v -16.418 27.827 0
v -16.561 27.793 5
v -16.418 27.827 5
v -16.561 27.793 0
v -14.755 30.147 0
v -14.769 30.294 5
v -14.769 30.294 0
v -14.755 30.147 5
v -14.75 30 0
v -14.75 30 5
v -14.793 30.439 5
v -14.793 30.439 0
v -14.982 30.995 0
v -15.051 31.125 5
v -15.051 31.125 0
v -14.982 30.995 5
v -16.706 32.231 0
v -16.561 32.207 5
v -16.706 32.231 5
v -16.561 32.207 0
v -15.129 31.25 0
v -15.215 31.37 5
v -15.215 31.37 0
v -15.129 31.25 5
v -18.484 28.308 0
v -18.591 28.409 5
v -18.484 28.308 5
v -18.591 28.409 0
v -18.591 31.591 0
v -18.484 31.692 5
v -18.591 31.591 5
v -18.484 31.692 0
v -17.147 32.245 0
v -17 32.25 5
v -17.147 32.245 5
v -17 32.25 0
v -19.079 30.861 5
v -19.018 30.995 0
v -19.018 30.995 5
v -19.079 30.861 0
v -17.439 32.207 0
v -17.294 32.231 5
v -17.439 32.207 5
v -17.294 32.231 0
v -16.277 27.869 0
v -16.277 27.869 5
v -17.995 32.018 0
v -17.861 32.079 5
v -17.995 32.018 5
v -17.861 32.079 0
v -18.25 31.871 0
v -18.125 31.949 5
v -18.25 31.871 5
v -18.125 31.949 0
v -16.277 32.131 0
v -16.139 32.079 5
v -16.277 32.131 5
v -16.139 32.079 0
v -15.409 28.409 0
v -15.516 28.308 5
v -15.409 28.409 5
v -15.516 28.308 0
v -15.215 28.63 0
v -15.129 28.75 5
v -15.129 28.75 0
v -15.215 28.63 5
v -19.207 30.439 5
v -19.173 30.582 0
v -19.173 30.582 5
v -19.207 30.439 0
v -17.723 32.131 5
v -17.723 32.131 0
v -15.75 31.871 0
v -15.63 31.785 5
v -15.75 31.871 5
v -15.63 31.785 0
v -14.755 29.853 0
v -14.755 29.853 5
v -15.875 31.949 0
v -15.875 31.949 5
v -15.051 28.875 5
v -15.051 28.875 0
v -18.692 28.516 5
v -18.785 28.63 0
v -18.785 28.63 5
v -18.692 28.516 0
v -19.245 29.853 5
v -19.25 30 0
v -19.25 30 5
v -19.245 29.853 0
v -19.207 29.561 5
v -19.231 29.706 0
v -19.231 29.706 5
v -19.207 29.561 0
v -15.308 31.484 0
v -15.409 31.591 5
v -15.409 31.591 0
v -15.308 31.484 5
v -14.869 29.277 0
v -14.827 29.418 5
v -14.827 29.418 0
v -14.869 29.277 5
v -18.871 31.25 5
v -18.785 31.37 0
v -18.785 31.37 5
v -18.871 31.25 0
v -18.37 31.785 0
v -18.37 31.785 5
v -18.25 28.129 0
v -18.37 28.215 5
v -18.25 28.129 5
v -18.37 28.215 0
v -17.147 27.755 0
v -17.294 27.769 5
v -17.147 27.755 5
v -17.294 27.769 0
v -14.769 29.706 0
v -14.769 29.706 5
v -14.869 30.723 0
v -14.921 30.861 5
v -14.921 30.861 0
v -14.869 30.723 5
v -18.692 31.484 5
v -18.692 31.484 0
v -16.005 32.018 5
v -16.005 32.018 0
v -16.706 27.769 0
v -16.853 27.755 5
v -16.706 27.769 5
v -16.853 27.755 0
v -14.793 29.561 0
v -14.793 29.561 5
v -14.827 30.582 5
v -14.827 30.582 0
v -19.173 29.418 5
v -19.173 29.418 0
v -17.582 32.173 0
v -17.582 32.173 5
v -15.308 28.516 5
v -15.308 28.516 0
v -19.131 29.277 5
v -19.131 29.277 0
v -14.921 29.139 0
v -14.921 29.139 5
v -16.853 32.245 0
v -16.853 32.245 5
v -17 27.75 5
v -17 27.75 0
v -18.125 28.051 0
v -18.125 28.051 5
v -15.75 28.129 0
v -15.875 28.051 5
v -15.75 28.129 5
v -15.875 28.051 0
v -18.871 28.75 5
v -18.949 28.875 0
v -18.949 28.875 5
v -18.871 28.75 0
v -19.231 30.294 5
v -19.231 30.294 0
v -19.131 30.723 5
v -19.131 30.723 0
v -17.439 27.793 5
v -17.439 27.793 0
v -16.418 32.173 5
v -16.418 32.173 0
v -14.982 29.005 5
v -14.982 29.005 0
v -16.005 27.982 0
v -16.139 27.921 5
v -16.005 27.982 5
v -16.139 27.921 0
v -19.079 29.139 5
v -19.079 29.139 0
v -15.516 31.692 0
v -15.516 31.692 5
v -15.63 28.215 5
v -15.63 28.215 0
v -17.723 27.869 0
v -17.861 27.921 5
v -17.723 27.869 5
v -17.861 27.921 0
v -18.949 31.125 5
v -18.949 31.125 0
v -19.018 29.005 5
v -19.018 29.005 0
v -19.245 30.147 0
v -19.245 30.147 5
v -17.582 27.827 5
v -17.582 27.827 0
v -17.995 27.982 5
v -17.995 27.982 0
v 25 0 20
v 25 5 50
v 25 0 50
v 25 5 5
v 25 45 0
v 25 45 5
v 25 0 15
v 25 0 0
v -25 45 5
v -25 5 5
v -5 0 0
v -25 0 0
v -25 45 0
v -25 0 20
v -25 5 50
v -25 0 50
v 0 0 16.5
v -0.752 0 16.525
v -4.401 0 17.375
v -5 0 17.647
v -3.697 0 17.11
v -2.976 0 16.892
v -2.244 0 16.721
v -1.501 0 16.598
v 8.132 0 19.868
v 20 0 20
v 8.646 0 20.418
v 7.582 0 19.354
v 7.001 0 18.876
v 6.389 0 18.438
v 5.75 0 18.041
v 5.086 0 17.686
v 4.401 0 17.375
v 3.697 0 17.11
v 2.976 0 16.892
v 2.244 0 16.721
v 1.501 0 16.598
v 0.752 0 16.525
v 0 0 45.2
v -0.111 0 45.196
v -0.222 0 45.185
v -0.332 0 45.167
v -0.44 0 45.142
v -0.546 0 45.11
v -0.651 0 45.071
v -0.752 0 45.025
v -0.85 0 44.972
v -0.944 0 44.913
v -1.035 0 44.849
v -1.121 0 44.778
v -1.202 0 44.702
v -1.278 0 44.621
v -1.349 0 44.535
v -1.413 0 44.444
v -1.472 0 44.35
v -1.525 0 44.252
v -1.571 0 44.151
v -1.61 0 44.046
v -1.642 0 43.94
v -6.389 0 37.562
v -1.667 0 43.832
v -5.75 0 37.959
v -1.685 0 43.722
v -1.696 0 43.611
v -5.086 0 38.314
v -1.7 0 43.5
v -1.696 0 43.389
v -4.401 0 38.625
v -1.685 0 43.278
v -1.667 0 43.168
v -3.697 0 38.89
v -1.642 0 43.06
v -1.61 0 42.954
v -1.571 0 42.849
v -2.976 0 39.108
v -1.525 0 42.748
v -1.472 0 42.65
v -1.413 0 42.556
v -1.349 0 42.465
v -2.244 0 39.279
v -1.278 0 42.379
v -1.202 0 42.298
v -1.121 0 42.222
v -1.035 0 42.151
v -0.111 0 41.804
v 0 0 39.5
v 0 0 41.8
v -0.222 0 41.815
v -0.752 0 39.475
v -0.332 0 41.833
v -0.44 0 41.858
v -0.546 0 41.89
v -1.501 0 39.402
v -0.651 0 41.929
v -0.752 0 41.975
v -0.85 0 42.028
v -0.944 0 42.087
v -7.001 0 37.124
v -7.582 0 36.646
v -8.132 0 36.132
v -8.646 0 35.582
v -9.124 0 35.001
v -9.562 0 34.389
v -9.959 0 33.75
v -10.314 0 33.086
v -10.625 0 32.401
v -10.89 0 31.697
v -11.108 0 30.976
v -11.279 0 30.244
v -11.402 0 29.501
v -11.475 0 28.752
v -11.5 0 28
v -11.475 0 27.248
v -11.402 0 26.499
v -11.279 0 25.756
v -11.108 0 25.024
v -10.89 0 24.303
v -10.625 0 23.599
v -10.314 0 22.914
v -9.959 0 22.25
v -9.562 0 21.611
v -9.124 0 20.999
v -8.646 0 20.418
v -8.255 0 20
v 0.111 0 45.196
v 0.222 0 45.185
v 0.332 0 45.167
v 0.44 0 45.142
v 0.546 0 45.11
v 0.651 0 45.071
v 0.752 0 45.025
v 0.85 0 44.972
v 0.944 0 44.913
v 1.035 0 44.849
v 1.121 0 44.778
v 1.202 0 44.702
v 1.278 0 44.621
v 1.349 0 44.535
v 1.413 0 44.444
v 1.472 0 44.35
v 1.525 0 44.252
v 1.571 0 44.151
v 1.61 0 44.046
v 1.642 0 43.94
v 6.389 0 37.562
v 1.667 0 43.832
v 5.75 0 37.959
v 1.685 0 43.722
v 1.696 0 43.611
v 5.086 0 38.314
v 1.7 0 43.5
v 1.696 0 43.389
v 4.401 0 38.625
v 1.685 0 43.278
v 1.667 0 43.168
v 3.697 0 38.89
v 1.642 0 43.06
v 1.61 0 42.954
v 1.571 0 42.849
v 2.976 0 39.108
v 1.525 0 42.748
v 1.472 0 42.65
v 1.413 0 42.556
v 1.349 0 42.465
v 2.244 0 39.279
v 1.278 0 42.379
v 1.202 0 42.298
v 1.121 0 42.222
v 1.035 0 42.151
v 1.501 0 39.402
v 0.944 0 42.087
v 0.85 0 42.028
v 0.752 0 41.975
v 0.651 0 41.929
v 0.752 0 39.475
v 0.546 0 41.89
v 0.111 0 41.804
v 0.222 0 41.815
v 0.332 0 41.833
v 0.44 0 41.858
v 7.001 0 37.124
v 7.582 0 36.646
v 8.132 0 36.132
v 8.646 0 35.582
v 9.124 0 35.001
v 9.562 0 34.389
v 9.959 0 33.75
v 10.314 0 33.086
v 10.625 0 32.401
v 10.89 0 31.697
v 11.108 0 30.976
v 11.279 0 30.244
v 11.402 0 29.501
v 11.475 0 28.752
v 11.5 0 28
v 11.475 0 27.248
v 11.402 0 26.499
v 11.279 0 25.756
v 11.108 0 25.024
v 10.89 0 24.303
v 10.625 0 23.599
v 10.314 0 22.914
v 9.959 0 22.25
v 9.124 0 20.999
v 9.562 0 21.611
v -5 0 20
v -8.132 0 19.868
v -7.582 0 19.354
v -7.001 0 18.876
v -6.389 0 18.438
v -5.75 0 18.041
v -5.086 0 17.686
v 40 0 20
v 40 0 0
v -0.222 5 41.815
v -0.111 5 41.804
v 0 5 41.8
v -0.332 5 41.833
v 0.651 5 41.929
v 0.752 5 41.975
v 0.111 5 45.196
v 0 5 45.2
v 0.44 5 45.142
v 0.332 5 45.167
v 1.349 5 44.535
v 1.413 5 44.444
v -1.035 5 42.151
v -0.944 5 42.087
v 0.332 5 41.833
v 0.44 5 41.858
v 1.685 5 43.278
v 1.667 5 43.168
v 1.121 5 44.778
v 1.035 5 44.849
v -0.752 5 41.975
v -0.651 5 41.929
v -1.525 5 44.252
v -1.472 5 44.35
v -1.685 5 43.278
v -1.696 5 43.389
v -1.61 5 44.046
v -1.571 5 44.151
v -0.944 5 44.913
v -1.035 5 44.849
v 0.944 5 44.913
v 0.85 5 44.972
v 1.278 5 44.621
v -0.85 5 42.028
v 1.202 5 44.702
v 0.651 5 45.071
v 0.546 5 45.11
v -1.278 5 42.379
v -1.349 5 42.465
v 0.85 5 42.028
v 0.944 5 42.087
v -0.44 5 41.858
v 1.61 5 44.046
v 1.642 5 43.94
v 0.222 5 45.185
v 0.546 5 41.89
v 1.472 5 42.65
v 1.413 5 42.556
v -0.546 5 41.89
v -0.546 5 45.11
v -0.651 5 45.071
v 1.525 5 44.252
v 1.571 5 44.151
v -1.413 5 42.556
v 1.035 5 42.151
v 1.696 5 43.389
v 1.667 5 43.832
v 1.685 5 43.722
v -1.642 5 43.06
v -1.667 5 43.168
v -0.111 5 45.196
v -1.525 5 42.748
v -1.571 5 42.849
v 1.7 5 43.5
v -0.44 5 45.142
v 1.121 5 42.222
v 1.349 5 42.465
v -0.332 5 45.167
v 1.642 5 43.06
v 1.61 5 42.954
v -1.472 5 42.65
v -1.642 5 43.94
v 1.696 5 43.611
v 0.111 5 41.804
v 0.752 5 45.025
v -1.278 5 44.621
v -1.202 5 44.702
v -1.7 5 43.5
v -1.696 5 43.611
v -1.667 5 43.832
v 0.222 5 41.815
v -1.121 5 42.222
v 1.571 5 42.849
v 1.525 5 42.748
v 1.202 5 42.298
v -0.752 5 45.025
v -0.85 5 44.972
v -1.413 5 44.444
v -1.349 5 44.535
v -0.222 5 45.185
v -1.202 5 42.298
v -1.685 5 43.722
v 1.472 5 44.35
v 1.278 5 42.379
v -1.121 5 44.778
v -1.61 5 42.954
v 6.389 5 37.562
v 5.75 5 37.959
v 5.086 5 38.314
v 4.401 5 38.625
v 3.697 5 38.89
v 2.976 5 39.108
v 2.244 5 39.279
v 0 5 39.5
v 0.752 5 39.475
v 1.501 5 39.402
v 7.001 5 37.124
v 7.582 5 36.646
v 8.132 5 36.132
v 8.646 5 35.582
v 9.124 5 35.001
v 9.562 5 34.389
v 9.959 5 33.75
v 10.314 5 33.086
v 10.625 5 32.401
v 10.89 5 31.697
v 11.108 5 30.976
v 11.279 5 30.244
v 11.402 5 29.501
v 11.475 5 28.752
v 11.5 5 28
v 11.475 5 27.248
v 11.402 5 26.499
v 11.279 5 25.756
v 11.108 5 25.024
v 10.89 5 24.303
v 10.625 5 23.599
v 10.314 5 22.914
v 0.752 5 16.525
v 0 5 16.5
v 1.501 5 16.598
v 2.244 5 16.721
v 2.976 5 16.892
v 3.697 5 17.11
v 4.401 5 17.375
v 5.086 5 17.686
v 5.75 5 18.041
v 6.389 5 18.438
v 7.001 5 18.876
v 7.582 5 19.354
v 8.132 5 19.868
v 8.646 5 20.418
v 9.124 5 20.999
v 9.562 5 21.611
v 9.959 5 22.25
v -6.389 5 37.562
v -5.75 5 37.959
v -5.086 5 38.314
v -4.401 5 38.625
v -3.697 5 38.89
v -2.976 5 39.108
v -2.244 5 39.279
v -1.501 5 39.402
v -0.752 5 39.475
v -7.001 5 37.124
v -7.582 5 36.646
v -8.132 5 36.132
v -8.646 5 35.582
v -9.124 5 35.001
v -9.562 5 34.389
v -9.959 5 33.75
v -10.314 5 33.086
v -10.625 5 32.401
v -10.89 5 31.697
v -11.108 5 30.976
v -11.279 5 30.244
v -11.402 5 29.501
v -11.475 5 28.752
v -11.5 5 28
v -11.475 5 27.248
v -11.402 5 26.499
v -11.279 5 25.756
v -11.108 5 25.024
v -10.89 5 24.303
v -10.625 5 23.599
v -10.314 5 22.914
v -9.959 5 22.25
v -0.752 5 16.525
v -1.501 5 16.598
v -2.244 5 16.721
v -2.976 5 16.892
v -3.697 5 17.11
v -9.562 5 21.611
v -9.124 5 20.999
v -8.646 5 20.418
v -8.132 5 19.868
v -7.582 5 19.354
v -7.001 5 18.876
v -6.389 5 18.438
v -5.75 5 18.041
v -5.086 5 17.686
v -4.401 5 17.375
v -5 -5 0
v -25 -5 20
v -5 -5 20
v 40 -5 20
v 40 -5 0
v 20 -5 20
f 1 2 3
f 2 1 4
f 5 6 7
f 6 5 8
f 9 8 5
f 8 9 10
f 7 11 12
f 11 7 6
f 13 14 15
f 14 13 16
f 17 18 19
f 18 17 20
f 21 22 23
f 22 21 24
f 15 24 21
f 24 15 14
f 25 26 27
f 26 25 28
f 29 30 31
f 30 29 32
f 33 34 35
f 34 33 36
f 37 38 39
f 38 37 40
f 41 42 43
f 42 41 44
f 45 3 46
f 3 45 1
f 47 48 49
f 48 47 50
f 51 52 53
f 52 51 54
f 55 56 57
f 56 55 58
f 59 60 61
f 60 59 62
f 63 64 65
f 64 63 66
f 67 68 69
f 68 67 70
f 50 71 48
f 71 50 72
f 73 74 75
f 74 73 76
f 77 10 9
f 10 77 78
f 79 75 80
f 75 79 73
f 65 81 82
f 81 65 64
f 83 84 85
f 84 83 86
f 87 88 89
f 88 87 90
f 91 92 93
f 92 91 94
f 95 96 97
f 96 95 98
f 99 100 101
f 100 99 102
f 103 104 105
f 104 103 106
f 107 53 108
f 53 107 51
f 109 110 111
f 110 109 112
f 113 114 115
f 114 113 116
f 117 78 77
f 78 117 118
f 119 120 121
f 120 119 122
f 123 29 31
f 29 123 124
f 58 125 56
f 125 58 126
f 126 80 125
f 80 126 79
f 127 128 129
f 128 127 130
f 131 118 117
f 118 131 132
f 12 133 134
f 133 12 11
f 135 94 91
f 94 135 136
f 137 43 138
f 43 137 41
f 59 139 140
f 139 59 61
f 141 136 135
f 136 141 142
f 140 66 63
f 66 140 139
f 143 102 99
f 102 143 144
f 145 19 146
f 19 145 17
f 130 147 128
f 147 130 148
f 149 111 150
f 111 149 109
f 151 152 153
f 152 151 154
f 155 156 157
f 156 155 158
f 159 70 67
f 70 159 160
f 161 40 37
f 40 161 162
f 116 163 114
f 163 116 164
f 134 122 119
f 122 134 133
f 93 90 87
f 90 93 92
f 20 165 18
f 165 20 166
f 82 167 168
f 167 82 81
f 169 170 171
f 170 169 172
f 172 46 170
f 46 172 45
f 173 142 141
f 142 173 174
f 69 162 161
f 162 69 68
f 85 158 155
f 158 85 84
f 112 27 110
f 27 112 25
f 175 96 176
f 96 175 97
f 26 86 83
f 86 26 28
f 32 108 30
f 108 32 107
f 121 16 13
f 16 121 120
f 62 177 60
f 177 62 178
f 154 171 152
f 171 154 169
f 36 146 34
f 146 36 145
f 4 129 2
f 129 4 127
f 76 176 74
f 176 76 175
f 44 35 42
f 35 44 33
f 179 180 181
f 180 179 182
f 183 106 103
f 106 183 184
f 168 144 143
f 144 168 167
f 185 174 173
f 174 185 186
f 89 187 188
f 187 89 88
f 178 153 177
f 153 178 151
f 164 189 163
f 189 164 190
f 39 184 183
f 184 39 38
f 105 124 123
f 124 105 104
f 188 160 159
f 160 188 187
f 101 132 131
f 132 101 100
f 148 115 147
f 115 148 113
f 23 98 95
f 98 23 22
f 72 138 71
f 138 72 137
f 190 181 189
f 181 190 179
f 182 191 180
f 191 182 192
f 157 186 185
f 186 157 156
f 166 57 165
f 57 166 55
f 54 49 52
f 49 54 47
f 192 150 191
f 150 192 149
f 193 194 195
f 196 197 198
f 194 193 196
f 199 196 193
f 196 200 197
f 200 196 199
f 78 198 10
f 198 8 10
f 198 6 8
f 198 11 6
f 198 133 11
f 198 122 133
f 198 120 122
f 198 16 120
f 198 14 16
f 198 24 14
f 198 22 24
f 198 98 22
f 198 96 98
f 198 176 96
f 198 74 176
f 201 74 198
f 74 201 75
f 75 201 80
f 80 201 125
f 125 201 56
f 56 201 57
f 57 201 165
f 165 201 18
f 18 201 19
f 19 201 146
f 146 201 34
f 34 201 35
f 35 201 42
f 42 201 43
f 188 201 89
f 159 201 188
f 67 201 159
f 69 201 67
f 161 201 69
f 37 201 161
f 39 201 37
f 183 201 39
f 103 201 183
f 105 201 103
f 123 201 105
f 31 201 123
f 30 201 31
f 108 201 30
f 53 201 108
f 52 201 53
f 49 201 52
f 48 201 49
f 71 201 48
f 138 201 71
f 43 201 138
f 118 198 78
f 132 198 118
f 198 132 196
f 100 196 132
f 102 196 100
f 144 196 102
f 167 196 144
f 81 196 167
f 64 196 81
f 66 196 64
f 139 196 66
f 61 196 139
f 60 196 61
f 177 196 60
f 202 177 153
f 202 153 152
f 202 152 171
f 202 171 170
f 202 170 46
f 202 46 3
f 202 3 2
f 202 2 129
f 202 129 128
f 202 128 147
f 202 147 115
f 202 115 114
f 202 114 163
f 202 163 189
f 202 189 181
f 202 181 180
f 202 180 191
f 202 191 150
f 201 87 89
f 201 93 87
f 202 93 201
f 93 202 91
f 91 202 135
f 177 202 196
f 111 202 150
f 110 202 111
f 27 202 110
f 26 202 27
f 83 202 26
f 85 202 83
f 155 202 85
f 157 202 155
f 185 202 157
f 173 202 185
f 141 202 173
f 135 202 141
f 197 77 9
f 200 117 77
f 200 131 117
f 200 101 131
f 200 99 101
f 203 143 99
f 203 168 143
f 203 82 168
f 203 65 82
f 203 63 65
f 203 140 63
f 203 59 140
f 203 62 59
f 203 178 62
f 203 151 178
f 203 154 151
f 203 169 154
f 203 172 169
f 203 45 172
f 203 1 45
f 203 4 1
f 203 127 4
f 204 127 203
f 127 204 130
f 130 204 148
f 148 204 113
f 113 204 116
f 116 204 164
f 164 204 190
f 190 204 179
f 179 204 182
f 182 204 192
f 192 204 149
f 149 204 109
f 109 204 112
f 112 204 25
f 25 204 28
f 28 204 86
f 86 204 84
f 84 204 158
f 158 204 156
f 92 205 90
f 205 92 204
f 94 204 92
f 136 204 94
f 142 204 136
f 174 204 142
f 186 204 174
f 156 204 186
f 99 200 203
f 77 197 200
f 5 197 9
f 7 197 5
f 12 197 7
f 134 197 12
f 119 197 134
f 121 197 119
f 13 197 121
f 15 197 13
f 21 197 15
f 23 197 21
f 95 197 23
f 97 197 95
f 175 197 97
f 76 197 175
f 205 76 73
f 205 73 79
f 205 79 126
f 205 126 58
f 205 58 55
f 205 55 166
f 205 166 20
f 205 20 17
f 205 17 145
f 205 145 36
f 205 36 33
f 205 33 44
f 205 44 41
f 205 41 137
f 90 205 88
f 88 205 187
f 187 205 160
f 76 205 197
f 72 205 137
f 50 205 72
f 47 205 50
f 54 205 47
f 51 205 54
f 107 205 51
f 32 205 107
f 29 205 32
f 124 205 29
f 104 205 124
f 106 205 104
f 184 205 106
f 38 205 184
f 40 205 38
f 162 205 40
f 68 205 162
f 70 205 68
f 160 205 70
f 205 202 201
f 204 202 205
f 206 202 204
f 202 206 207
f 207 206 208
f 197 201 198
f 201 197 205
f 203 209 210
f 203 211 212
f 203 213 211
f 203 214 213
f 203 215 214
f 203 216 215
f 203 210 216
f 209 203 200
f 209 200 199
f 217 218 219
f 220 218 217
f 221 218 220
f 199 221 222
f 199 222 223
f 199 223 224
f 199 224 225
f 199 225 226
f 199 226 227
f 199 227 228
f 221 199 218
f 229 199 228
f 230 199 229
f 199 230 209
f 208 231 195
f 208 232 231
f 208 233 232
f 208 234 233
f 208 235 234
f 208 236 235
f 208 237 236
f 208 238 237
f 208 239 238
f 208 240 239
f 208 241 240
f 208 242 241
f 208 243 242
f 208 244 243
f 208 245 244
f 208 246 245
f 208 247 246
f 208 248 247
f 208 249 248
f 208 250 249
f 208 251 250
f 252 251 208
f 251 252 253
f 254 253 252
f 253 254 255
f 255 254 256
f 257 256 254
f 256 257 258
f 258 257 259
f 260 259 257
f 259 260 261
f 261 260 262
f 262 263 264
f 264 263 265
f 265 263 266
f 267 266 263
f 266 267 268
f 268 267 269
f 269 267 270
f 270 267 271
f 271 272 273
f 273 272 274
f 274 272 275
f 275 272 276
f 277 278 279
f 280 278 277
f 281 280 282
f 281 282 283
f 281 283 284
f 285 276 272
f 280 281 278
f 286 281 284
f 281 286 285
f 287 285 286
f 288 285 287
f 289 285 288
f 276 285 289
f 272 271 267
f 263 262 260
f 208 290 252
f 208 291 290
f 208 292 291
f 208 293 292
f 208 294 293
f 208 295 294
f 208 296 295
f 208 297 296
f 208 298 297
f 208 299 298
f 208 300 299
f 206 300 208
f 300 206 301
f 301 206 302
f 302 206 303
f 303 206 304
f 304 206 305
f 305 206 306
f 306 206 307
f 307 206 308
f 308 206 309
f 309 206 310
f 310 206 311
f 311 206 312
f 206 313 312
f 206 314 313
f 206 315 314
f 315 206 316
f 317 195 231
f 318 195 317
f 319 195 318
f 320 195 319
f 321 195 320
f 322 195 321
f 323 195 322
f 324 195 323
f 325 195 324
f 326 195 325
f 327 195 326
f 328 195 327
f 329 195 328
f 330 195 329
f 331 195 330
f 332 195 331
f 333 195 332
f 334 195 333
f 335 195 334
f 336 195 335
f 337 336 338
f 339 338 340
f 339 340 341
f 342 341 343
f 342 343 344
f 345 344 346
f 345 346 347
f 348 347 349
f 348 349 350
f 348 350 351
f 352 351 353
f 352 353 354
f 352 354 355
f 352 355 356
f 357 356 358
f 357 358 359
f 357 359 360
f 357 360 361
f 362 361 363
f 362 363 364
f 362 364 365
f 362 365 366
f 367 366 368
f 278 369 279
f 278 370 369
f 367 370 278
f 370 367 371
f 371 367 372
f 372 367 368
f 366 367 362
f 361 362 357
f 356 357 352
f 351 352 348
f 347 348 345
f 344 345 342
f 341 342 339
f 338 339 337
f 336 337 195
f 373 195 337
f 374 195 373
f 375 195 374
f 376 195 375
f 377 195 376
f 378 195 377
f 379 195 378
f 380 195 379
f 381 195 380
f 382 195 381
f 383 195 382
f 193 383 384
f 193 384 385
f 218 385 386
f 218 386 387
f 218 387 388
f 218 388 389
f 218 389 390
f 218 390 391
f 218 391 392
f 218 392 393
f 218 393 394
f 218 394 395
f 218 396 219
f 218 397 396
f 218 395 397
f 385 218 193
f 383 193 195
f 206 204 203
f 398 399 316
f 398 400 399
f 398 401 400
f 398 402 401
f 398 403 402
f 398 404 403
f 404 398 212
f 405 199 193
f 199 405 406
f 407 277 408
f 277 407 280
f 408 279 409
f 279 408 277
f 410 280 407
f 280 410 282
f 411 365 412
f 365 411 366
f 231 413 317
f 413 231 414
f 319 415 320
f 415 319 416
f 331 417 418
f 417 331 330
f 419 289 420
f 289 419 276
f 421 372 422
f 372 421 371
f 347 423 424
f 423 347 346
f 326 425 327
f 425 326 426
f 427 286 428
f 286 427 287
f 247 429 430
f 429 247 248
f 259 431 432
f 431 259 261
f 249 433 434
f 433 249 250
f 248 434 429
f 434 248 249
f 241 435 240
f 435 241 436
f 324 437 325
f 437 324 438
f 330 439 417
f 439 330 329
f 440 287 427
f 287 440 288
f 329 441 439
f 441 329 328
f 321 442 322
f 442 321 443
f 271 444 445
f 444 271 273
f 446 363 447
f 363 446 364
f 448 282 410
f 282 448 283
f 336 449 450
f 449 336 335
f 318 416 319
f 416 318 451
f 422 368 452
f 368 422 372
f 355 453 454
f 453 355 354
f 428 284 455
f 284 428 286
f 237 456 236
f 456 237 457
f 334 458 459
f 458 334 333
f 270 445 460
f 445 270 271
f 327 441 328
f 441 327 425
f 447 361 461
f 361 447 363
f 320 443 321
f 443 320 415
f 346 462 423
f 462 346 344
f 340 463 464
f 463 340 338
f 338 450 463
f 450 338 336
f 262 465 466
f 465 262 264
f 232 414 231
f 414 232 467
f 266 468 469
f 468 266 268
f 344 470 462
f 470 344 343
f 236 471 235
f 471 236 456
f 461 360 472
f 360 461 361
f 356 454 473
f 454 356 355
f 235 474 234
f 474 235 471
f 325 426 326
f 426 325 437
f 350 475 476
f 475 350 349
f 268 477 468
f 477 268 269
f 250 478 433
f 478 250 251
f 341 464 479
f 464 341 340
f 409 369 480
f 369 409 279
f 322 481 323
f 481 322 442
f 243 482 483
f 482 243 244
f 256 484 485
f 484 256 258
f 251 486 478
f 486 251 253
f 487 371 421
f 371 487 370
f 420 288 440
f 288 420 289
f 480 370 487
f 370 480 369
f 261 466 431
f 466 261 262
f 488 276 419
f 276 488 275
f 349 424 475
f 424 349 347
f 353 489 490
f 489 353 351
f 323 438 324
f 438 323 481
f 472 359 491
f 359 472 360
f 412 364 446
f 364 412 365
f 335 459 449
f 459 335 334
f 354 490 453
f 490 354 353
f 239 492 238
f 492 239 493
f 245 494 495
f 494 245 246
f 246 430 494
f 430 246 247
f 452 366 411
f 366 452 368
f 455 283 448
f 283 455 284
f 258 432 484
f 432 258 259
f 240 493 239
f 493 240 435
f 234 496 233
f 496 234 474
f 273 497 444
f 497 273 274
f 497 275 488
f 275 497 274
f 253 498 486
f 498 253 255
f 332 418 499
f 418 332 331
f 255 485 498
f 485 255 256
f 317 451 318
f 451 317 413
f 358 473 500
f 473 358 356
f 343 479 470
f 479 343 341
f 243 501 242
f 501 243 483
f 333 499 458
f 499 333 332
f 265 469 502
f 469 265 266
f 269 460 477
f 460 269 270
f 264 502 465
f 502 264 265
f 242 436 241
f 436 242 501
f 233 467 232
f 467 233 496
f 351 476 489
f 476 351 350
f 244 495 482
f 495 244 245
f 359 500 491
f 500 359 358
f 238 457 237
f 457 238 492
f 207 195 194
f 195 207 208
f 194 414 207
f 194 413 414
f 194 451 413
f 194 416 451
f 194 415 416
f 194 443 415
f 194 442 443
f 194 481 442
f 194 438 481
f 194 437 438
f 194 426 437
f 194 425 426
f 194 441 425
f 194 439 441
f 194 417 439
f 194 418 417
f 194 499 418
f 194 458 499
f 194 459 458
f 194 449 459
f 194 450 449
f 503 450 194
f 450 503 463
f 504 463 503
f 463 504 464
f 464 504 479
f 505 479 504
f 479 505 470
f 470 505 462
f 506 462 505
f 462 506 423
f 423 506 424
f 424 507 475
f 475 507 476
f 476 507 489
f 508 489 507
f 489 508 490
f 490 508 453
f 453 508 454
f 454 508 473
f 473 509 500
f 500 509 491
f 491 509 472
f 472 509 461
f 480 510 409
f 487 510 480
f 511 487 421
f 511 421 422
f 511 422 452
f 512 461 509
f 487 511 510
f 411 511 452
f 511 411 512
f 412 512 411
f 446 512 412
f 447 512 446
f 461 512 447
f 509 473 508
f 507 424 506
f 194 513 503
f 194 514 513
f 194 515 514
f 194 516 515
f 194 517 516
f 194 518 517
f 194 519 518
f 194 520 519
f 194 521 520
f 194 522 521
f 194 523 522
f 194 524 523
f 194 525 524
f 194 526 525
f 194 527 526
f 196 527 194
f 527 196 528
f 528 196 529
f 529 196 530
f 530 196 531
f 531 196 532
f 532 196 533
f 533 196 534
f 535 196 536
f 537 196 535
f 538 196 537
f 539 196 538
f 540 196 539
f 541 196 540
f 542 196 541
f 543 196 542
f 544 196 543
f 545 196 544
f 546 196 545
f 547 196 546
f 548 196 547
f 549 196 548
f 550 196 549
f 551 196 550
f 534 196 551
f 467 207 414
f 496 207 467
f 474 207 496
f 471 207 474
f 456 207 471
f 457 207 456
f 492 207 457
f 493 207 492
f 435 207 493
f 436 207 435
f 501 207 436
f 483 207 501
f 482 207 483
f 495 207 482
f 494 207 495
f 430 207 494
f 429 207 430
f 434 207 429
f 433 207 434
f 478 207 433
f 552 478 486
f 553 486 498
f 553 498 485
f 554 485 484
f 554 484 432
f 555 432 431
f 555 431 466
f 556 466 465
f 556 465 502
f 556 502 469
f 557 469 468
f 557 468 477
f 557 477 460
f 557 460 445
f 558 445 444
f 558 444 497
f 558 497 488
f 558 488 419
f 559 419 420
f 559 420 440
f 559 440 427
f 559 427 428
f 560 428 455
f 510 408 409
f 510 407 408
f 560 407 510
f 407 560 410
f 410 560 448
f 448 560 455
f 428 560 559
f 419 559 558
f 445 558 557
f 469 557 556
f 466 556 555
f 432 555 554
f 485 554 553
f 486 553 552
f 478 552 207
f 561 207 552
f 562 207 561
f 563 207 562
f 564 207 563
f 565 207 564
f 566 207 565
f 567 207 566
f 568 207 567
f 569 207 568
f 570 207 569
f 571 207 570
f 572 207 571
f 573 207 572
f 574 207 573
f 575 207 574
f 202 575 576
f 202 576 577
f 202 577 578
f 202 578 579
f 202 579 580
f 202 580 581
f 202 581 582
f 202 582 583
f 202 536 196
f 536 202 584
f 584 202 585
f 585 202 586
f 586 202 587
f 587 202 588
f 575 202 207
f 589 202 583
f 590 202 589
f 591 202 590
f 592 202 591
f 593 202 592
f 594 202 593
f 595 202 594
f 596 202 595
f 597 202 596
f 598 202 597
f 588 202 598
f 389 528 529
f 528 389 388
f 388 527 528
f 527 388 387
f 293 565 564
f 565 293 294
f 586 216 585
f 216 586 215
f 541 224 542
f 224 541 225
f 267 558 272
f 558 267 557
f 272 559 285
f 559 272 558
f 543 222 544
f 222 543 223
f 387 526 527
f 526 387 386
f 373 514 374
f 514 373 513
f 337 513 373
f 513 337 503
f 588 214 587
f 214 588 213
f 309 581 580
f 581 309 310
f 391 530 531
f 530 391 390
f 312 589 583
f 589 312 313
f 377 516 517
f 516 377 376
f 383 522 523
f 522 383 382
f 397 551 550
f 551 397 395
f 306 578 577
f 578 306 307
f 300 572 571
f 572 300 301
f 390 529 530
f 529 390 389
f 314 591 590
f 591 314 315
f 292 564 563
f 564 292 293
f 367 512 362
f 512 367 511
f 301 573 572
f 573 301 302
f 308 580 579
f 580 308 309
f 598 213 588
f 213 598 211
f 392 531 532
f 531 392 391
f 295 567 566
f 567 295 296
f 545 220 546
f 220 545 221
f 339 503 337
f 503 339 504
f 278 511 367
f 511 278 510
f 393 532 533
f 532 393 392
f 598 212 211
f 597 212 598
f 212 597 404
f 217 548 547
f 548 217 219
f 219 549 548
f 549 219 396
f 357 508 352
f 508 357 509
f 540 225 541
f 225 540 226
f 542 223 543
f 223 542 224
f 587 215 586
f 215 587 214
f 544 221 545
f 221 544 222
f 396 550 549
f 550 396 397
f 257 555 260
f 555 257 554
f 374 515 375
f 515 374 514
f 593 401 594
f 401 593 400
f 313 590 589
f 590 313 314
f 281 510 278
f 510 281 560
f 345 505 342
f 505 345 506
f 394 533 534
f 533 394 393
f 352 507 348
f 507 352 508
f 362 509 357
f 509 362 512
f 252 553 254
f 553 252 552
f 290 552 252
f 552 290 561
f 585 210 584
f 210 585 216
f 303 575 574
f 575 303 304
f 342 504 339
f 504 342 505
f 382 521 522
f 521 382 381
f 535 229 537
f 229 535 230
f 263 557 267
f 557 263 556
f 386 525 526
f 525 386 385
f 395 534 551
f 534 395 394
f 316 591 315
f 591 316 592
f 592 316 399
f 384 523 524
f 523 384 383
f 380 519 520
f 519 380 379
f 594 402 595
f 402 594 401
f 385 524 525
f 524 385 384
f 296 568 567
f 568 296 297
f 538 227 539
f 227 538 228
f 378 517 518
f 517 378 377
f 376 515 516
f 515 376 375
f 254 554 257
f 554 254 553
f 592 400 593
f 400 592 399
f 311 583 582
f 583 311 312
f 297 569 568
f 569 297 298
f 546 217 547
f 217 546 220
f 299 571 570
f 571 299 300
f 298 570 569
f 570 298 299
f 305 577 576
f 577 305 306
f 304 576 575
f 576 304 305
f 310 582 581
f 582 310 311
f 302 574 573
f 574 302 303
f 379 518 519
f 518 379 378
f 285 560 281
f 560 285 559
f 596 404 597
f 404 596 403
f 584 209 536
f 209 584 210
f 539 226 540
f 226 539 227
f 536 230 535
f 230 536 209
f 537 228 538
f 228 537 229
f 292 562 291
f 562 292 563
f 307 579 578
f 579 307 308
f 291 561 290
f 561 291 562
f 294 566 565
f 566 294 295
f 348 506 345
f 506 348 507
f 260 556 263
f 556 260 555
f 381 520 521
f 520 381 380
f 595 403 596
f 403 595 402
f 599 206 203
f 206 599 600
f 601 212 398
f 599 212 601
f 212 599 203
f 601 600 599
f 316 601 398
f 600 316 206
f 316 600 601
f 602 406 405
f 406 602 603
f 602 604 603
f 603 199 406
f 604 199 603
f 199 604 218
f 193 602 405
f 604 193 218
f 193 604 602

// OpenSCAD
// L-shaped mounting bracket for NEMA 17 stepper motor
// Print orientation: base plate flat on bed, motor plate vertical

// ---------------- Parameters ----------------
plate_x       = 25;    // base plate half-width (X)
plate_y       = 45;    // base plate length (Y)
plate_t       = 5;     // base plate thickness (Z)

motor_h       = 50;    // motor plate height (Z)
motor_w       = 5;     // motor plate thickness (Y)

boss_d        = 23;    // motor boss hole diameter
boss_x        = 0;     // boss hole centre X
boss_z        = 28;    // boss hole centre Z

screw_d       = 3.4;   // M3 screw hole diameter
screw_pitch   = 31;    // square pitch for screw holes
screw_count   = 4;     // number of screw holes

gusset_t      = 5;     // gusset thickness (X)
gusset_leg    = 20;    // gusset right-triangle leg length (Y and Z)

eps           = 0.5;   // cutter overshoot past faces
$fn           = 96;    // curve resolution

// ---------------- Model ----------------
union() {
    // Base plate with M4 through-holes
    difference() {
        translate([-plate_x, 0, 0])
            cube([plate_x * 2, plate_y, plate_t]);
        for (h = [0, 1])
            translate([-17, 30, h * plate_t - eps])
                cylinder(d = 4.5, h = plate_t + 2 * eps);
    }

    // Vertical motor plate with boss hole and M3 screw holes
    difference() {
        translate([-plate_x, 0, 0])
            cube([plate_x * 2, motor_w, motor_h]);
        translate([boss_x, -eps, boss_z])
            rotate([-90, 0, 0])
                cylinder(d = boss_d, h = motor_w + 2 * eps);
        for (i = [0 : screw_count - 1]) {
            a = atan2(sin(i * 90), cos(i * 90));
            translate([boss_x, motor_w / 2 - screw_pitch / 2,
                       boss_z + screw_pitch / 2])
                rotate([0, 90, a])
                    cylinder(d = screw_d, h = screw_pitch + 2 * eps);
        }
    }

    // Triangular gussets flush with left and right edges
    for (gx = [-25, 20])
        translate([gx, 0, 0])
            rotate([90, 0, 0])
                linear_extrude(height = gusset_t)
                    polygon(points = [
                        [gusset_leg, gusset_leg],
                        [gusset_leg, 0],
                        [0, gusset_leg]
                    ]);
}
